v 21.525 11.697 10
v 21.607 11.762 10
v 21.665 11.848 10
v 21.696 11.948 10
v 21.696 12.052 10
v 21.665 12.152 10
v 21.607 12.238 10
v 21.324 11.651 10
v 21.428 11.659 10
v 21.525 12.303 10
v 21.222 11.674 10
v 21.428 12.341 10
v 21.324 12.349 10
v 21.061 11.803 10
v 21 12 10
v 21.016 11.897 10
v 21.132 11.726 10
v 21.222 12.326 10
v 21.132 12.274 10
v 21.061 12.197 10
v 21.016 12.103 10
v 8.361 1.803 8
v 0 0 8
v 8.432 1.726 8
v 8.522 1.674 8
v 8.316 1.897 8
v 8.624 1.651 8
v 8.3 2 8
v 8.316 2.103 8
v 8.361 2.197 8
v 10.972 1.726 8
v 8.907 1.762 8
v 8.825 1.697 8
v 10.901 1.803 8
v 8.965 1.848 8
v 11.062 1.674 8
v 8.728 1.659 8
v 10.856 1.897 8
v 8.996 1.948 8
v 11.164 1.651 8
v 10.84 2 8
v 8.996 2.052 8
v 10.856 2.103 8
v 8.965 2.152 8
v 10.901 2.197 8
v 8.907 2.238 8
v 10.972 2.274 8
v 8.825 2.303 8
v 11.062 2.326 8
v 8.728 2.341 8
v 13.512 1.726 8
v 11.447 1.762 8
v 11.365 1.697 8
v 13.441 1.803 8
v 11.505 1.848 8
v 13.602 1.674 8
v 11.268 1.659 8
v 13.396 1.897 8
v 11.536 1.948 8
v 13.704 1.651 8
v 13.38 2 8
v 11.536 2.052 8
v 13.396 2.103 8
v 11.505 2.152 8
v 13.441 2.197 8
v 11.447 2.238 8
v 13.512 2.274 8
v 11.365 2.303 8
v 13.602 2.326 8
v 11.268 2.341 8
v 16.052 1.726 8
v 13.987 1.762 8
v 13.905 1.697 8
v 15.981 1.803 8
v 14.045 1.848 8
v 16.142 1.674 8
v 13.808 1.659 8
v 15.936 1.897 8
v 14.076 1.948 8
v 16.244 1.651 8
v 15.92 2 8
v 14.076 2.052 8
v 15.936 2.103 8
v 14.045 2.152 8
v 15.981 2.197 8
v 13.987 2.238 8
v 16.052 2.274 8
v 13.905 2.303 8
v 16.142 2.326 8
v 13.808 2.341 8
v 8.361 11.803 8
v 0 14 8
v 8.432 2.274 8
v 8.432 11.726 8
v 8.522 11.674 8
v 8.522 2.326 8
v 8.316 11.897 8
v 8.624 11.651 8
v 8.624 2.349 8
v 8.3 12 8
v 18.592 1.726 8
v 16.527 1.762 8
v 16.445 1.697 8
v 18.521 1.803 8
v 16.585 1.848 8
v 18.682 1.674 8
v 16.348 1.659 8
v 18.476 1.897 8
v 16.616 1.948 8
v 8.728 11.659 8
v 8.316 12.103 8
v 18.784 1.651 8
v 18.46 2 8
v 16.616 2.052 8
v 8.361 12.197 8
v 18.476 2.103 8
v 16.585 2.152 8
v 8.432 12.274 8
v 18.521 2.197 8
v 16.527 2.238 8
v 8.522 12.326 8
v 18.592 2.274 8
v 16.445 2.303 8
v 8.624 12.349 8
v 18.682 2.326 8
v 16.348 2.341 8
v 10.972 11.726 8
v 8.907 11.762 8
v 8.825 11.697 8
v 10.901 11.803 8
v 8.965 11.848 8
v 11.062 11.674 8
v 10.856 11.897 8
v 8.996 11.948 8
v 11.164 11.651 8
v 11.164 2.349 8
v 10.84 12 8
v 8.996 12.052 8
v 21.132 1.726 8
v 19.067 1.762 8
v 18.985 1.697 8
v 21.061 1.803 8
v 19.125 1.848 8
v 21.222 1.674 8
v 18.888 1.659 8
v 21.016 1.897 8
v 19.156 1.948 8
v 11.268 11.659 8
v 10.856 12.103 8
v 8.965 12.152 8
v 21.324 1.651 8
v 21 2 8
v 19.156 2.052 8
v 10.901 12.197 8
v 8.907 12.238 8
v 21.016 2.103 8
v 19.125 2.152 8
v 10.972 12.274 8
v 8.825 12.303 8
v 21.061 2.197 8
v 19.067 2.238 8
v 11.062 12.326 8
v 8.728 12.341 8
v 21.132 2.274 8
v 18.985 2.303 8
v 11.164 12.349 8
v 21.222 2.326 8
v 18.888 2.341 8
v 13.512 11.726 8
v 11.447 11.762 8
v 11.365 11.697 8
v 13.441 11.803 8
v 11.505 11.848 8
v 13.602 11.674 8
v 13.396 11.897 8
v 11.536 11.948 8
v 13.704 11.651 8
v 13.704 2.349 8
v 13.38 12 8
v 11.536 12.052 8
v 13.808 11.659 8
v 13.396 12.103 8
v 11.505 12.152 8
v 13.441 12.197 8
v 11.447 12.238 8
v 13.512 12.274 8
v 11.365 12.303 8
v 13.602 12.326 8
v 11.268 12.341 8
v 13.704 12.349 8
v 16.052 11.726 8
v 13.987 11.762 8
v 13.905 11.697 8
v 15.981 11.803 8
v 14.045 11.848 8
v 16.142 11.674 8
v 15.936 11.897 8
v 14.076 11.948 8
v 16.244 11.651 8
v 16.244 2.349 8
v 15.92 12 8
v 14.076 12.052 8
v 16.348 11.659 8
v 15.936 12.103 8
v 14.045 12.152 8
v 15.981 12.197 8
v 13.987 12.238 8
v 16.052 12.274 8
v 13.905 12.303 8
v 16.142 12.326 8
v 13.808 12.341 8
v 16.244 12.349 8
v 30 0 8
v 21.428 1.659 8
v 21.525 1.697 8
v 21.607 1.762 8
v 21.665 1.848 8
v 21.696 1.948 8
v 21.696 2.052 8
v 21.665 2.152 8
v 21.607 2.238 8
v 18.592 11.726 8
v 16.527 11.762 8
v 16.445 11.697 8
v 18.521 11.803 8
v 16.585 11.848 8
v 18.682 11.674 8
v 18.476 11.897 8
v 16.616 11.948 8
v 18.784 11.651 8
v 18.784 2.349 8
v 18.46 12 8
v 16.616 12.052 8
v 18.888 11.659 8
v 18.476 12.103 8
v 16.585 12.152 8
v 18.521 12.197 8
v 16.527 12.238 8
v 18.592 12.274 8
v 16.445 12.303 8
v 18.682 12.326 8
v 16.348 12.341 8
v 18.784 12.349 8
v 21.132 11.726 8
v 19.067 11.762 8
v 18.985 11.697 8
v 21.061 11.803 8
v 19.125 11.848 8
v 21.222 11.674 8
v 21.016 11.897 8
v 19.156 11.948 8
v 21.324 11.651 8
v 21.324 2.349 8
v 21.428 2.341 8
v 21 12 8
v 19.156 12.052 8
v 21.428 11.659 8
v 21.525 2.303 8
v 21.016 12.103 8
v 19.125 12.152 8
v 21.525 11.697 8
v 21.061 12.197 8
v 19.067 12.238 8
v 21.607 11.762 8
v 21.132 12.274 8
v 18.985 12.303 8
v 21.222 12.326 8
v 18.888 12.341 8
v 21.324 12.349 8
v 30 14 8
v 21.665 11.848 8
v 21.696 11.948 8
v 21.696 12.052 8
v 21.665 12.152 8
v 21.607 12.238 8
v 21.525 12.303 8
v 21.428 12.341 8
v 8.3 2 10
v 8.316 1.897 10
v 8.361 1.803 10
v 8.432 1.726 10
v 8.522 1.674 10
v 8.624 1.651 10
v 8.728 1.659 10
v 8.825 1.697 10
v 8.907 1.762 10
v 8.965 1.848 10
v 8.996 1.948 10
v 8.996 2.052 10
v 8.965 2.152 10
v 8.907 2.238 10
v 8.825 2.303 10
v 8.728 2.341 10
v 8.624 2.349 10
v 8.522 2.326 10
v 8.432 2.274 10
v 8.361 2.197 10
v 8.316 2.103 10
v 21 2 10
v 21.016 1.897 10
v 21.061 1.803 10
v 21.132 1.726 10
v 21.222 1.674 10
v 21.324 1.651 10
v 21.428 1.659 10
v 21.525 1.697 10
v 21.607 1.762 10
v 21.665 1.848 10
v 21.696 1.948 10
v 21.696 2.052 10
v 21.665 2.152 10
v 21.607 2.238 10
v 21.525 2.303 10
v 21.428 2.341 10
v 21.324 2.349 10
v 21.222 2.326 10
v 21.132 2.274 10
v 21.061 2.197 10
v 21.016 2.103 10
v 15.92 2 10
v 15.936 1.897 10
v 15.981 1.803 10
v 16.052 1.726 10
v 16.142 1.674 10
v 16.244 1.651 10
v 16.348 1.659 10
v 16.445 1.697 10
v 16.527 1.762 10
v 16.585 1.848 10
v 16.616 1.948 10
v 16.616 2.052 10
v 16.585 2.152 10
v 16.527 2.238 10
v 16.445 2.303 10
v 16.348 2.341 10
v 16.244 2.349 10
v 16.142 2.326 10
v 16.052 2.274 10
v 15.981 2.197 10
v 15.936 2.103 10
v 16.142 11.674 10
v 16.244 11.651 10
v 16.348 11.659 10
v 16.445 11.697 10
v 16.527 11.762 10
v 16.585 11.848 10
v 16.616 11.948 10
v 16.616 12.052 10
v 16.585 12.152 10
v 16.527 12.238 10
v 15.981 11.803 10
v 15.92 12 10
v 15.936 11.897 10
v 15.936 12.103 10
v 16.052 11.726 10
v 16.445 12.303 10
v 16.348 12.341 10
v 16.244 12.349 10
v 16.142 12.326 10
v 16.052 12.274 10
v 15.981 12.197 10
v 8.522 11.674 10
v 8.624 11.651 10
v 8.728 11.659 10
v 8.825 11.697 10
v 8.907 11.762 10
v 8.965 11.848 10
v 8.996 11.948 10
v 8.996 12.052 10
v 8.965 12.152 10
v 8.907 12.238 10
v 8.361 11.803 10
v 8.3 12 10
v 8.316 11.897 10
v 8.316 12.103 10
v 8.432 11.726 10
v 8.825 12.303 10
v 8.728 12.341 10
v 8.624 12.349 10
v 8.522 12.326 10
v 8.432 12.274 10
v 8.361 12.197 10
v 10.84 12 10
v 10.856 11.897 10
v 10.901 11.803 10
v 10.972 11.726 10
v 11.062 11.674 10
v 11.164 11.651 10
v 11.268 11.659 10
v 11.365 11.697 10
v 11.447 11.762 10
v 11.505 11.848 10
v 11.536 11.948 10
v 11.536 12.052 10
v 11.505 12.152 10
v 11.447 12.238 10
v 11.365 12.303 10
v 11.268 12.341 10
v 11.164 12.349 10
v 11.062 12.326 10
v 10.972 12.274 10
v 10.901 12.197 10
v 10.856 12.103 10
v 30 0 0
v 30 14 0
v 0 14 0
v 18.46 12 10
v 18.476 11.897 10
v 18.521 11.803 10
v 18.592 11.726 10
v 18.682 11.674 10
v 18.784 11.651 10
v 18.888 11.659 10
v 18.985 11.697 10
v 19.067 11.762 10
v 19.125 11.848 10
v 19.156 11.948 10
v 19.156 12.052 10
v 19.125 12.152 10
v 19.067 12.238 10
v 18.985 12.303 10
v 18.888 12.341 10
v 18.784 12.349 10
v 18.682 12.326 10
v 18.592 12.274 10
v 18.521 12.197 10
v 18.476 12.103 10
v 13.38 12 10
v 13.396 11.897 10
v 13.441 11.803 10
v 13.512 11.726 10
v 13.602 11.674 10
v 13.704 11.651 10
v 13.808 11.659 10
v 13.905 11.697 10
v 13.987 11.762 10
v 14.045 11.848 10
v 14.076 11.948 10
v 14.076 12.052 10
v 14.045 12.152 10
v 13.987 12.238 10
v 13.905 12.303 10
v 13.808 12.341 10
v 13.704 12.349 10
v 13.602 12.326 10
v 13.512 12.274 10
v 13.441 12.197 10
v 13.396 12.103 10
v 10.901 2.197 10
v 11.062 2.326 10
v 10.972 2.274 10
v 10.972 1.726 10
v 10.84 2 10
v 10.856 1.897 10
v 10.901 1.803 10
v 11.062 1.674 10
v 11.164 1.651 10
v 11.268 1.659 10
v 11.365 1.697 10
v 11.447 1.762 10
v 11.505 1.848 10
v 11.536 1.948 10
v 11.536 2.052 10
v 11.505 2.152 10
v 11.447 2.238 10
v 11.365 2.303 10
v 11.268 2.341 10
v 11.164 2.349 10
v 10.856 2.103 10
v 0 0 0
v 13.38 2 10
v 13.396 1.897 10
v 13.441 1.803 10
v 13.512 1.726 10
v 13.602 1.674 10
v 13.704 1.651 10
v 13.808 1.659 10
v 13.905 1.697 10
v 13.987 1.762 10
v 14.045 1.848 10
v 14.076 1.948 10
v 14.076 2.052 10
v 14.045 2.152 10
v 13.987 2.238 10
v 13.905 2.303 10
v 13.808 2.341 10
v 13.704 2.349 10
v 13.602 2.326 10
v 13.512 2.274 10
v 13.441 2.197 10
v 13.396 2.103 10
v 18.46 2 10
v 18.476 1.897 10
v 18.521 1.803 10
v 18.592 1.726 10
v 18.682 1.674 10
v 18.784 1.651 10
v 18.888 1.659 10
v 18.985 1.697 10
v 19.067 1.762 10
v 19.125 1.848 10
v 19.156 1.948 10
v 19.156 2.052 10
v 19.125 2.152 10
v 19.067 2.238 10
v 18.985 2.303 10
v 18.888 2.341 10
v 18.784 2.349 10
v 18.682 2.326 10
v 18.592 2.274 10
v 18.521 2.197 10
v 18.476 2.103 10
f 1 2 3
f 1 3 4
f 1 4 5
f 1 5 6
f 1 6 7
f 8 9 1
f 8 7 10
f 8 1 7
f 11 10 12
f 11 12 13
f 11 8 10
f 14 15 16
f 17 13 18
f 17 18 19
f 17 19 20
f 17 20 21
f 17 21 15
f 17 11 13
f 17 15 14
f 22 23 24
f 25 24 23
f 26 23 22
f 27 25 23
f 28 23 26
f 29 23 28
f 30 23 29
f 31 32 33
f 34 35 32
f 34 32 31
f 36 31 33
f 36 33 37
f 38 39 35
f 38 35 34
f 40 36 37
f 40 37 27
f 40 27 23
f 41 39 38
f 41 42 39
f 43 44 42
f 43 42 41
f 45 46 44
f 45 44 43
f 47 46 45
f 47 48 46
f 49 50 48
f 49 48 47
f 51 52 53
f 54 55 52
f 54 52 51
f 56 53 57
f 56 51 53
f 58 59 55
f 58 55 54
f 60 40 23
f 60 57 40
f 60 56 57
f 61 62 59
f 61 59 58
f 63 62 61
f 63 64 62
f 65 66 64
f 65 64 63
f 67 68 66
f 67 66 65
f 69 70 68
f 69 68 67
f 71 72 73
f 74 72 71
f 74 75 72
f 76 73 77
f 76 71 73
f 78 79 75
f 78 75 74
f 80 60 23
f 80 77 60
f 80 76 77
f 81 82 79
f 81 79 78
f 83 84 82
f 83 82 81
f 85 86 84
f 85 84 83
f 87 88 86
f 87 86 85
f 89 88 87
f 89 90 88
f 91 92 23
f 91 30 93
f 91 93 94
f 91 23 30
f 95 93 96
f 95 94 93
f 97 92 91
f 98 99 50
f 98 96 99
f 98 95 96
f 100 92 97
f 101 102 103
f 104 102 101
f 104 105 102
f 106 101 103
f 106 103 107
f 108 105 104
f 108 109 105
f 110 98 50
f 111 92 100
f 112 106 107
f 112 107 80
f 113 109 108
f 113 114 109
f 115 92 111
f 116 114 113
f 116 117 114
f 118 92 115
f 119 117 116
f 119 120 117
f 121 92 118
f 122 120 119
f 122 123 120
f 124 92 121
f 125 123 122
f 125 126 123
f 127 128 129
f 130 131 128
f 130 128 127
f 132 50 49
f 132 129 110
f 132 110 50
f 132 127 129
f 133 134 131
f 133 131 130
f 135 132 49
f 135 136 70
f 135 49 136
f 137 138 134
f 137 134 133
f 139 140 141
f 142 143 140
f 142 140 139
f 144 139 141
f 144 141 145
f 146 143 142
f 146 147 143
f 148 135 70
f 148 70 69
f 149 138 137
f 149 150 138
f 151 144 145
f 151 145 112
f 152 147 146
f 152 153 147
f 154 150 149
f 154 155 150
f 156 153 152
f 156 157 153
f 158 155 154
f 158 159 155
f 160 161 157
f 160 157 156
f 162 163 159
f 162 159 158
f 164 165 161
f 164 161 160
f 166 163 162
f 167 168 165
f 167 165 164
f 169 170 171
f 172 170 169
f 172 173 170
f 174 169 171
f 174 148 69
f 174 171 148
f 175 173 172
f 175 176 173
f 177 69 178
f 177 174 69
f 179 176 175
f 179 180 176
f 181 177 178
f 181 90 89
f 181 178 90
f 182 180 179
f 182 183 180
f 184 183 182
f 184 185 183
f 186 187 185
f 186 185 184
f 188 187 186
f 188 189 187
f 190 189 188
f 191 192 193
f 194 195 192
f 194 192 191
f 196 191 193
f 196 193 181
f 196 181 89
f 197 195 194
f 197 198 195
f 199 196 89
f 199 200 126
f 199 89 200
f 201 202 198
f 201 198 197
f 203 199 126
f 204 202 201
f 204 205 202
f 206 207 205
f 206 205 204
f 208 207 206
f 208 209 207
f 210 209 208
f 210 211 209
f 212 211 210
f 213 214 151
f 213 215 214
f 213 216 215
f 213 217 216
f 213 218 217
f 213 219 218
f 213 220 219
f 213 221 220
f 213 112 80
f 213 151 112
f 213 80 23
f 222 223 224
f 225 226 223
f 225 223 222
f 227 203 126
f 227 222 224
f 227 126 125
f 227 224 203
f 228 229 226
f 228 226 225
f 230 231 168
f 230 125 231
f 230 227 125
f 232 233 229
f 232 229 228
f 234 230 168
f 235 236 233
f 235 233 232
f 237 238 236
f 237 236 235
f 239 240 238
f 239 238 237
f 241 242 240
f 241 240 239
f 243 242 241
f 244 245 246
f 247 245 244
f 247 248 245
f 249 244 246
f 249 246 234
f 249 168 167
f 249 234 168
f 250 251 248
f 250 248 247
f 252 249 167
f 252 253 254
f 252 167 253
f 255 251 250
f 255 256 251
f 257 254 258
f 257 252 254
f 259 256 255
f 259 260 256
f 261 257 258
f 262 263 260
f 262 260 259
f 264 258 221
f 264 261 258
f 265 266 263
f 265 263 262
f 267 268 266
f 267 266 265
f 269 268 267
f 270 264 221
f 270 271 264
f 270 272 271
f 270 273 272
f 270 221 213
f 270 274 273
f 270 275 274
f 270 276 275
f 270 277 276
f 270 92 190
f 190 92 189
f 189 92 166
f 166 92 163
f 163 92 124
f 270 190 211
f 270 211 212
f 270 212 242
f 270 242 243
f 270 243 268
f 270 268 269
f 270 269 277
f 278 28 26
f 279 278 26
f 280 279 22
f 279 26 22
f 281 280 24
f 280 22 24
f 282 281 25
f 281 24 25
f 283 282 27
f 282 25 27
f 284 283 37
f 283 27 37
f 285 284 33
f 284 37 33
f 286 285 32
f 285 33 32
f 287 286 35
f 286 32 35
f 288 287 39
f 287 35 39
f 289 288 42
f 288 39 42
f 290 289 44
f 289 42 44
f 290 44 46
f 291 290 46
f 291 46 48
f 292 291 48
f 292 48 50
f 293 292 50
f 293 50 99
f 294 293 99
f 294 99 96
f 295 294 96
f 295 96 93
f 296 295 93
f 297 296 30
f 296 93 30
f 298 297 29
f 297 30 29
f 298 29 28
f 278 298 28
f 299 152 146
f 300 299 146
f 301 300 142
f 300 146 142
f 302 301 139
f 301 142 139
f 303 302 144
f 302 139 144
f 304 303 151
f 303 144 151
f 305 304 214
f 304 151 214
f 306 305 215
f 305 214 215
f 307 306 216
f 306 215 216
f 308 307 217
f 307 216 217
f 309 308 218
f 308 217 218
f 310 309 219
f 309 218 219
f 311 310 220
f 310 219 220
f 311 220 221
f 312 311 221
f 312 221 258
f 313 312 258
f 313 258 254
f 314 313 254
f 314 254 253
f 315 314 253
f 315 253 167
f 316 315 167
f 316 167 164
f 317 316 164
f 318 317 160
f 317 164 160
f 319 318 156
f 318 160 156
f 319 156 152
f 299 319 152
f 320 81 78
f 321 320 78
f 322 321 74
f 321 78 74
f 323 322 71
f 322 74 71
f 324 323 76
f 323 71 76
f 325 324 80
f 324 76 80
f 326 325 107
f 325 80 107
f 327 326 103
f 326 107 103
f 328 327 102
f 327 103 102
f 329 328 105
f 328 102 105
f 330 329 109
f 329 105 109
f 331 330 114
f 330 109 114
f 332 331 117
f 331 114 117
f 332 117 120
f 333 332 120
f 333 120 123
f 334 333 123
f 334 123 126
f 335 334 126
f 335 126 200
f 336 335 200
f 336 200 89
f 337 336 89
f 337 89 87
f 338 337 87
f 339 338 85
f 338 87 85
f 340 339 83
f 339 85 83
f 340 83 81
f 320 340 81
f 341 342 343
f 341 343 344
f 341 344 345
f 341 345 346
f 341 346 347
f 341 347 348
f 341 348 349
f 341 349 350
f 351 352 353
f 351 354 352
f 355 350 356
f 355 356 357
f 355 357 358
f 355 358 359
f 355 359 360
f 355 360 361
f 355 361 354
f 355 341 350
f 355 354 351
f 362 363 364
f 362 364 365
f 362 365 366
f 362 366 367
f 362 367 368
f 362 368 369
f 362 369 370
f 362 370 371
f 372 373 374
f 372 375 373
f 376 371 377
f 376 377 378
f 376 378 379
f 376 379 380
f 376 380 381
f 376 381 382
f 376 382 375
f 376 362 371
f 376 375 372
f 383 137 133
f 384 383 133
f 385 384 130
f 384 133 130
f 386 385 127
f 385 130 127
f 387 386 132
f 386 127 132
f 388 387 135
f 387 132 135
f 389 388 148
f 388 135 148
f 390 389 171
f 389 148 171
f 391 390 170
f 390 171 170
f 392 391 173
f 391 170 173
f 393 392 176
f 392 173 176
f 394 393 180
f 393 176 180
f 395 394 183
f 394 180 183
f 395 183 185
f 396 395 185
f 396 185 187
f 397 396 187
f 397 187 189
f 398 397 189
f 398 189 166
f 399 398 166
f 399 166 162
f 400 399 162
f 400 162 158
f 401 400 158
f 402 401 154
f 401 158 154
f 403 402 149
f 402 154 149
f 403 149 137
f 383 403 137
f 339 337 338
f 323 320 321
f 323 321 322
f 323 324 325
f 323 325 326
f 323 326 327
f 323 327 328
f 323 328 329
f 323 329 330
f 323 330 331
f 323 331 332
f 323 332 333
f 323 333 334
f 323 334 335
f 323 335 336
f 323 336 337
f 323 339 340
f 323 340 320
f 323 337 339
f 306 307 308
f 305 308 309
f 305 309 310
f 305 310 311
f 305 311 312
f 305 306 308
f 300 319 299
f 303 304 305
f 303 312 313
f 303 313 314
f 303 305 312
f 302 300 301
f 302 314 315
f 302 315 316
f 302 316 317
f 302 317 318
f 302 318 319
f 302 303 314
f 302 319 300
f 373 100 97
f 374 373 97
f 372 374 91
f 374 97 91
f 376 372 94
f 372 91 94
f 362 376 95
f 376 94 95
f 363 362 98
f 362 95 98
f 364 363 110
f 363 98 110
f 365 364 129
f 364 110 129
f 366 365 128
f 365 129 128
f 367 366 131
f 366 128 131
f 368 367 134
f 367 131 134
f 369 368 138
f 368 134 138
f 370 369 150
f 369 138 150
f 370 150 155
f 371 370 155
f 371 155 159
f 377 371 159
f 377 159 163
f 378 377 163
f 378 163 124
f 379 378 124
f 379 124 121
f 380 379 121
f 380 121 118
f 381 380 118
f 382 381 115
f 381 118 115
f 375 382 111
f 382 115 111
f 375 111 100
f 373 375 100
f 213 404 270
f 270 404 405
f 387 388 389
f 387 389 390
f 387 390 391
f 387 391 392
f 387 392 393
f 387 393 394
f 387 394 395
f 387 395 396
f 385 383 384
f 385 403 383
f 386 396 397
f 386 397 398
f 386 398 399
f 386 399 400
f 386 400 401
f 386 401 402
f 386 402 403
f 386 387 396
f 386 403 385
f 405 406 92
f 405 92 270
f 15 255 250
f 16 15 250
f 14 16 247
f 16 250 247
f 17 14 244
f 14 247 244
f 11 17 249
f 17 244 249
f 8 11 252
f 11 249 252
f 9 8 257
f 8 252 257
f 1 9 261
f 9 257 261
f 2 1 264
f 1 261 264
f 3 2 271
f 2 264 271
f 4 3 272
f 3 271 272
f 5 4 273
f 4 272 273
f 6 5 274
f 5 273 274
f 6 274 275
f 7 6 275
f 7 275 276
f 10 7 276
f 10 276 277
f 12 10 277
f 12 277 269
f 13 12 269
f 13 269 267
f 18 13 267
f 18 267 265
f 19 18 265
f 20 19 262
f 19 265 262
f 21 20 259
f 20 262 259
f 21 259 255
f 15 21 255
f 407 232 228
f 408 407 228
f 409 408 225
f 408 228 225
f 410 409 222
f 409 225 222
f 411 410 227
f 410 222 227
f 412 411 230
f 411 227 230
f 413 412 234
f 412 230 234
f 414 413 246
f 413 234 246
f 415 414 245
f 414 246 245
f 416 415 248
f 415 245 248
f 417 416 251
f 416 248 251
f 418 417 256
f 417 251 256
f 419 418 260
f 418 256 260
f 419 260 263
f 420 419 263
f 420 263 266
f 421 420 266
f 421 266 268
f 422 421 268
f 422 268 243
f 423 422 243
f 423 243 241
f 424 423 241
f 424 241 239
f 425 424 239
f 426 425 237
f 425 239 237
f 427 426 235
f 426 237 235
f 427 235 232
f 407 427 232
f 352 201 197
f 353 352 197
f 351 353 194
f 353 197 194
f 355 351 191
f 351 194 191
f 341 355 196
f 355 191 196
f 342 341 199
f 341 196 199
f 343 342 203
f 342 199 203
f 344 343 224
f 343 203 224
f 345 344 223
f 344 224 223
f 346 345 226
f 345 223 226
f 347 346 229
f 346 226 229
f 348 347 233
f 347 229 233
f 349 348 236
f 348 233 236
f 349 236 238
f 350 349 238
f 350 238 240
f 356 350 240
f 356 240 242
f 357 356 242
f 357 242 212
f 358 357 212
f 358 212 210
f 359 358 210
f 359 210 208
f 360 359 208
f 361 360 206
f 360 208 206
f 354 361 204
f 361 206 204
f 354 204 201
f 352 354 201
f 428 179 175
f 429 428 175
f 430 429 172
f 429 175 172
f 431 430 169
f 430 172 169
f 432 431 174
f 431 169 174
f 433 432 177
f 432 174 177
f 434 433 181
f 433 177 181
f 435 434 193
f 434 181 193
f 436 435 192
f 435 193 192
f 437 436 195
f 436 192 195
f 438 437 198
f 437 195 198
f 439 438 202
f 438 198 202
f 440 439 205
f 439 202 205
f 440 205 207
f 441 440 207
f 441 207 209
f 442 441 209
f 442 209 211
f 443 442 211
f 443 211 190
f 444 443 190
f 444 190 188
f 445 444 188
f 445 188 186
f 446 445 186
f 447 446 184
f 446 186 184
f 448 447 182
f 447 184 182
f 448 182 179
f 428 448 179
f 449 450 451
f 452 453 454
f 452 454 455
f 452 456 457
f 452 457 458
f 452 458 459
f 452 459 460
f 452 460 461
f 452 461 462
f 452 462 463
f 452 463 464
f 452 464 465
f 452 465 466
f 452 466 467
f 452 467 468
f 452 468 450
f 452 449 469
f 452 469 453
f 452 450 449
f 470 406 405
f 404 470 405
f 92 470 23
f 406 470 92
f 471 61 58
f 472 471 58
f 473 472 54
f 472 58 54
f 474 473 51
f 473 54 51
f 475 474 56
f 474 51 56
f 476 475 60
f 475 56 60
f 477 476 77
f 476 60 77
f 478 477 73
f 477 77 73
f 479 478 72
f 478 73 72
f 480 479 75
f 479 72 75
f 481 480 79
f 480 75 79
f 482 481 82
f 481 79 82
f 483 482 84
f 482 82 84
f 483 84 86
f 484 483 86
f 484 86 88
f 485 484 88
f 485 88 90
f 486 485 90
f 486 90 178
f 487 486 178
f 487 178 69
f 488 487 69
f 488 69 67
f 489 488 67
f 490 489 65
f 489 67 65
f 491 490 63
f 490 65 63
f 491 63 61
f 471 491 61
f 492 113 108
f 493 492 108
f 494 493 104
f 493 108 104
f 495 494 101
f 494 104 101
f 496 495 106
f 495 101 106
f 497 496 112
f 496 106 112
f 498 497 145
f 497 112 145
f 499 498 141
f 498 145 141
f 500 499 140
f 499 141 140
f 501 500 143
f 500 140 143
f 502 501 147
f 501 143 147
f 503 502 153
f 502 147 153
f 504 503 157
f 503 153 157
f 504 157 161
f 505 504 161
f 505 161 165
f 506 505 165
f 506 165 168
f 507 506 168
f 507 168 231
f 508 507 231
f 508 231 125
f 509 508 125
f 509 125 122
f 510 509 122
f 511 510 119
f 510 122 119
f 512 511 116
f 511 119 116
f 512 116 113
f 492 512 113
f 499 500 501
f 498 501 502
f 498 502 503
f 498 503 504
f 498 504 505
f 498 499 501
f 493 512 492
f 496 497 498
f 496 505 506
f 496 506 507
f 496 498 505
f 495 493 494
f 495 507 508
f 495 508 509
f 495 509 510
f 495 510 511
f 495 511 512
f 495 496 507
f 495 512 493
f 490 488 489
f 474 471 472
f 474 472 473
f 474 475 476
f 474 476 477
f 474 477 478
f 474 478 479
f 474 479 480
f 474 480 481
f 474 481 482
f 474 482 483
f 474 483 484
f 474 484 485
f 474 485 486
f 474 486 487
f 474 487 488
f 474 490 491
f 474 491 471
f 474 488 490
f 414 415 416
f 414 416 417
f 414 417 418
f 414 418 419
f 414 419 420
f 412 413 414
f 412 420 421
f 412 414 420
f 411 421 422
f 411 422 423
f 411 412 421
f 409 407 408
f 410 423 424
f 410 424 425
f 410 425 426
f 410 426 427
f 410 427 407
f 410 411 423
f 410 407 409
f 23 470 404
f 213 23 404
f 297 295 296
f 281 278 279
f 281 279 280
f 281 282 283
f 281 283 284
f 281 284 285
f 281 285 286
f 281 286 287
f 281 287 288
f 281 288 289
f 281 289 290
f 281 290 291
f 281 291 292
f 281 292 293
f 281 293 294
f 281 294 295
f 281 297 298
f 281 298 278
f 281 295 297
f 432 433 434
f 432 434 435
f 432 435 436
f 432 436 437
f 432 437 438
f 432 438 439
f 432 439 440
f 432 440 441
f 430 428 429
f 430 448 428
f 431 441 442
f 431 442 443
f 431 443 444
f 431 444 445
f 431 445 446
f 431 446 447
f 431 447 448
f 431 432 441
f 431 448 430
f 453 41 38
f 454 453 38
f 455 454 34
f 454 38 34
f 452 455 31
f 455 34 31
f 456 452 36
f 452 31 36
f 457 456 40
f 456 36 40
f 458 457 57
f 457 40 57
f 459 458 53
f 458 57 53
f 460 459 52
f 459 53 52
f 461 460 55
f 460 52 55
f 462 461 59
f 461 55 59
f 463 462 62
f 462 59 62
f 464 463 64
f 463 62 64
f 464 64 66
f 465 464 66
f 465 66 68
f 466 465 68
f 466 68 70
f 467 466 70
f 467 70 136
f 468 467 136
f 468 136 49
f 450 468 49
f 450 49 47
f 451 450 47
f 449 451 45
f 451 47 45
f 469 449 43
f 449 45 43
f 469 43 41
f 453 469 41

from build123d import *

# Parameters (mm, degrees)
SKETCH_1_W      = 30
SKETCH_1_H      = 14
EXTRUDE_1_DEPTH = 8
SKETCH_2_R      = 0.35
EXTRUDE_2_DEPTH = 2


with BuildPart() as part:
    # 草图1 → 凸台-拉伸1 (new body)
    with BuildSketch(Plane.XY):
        with Locations((15, 7)):
            Rectangle(SKETCH_1_W, SKETCH_1_H)
    extrude(amount=EXTRUDE_1_DEPTH)

    # 草图2 → 凸台-拉伸2 (add)
    with BuildSketch(Plane.XY.offset(8)):
        with Locations(Location((13.73, 12, 0), (0, 0, 180))):
            Circle(SKETCH_2_R)
        with Locations(Location((16.27, 12, 0), (0, 0, 180))):
            Circle(SKETCH_2_R)
        with Locations(Location((18.81, 12, 0), (0, 0, 180))):
            Circle(SKETCH_2_R)
        with Locations(Location((21.35, 12, 0), (0, 0, 180))):
            Circle(SKETCH_2_R)
        with Locations(Location((13.73, 2, 0), (0, 0, 180))):
            Circle(SKETCH_2_R)
        with Locations(Location((16.27, 2, 0), (0, 0, 180))):
            Circle(SKETCH_2_R)
        with Locations(Location((18.81, 2, 0), (0, 0, 180))):
            Circle(SKETCH_2_R)
        with Locations(Location((21.35, 2, 0), (0, 0, 180))):
            Circle(SKETCH_2_R)
        with Locations(Location((11.19, 12, 0), (0, 0, 180))):
            Circle(SKETCH_2_R)
        with Locations(Location((8.65, 12, 0), (0, 0, 180))):
            Circle(SKETCH_2_R)
        with Locations(Location((11.19, 2, 0), (0, 0, 180))):
            Circle(SKETCH_2_R)
        with Locations(Location((8.65, 2, 0), (0, 0, 180))):
            Circle(SKETCH_2_R)
    extrude(amount=EXTRUDE_2_DEPTH)


solid = part.part
